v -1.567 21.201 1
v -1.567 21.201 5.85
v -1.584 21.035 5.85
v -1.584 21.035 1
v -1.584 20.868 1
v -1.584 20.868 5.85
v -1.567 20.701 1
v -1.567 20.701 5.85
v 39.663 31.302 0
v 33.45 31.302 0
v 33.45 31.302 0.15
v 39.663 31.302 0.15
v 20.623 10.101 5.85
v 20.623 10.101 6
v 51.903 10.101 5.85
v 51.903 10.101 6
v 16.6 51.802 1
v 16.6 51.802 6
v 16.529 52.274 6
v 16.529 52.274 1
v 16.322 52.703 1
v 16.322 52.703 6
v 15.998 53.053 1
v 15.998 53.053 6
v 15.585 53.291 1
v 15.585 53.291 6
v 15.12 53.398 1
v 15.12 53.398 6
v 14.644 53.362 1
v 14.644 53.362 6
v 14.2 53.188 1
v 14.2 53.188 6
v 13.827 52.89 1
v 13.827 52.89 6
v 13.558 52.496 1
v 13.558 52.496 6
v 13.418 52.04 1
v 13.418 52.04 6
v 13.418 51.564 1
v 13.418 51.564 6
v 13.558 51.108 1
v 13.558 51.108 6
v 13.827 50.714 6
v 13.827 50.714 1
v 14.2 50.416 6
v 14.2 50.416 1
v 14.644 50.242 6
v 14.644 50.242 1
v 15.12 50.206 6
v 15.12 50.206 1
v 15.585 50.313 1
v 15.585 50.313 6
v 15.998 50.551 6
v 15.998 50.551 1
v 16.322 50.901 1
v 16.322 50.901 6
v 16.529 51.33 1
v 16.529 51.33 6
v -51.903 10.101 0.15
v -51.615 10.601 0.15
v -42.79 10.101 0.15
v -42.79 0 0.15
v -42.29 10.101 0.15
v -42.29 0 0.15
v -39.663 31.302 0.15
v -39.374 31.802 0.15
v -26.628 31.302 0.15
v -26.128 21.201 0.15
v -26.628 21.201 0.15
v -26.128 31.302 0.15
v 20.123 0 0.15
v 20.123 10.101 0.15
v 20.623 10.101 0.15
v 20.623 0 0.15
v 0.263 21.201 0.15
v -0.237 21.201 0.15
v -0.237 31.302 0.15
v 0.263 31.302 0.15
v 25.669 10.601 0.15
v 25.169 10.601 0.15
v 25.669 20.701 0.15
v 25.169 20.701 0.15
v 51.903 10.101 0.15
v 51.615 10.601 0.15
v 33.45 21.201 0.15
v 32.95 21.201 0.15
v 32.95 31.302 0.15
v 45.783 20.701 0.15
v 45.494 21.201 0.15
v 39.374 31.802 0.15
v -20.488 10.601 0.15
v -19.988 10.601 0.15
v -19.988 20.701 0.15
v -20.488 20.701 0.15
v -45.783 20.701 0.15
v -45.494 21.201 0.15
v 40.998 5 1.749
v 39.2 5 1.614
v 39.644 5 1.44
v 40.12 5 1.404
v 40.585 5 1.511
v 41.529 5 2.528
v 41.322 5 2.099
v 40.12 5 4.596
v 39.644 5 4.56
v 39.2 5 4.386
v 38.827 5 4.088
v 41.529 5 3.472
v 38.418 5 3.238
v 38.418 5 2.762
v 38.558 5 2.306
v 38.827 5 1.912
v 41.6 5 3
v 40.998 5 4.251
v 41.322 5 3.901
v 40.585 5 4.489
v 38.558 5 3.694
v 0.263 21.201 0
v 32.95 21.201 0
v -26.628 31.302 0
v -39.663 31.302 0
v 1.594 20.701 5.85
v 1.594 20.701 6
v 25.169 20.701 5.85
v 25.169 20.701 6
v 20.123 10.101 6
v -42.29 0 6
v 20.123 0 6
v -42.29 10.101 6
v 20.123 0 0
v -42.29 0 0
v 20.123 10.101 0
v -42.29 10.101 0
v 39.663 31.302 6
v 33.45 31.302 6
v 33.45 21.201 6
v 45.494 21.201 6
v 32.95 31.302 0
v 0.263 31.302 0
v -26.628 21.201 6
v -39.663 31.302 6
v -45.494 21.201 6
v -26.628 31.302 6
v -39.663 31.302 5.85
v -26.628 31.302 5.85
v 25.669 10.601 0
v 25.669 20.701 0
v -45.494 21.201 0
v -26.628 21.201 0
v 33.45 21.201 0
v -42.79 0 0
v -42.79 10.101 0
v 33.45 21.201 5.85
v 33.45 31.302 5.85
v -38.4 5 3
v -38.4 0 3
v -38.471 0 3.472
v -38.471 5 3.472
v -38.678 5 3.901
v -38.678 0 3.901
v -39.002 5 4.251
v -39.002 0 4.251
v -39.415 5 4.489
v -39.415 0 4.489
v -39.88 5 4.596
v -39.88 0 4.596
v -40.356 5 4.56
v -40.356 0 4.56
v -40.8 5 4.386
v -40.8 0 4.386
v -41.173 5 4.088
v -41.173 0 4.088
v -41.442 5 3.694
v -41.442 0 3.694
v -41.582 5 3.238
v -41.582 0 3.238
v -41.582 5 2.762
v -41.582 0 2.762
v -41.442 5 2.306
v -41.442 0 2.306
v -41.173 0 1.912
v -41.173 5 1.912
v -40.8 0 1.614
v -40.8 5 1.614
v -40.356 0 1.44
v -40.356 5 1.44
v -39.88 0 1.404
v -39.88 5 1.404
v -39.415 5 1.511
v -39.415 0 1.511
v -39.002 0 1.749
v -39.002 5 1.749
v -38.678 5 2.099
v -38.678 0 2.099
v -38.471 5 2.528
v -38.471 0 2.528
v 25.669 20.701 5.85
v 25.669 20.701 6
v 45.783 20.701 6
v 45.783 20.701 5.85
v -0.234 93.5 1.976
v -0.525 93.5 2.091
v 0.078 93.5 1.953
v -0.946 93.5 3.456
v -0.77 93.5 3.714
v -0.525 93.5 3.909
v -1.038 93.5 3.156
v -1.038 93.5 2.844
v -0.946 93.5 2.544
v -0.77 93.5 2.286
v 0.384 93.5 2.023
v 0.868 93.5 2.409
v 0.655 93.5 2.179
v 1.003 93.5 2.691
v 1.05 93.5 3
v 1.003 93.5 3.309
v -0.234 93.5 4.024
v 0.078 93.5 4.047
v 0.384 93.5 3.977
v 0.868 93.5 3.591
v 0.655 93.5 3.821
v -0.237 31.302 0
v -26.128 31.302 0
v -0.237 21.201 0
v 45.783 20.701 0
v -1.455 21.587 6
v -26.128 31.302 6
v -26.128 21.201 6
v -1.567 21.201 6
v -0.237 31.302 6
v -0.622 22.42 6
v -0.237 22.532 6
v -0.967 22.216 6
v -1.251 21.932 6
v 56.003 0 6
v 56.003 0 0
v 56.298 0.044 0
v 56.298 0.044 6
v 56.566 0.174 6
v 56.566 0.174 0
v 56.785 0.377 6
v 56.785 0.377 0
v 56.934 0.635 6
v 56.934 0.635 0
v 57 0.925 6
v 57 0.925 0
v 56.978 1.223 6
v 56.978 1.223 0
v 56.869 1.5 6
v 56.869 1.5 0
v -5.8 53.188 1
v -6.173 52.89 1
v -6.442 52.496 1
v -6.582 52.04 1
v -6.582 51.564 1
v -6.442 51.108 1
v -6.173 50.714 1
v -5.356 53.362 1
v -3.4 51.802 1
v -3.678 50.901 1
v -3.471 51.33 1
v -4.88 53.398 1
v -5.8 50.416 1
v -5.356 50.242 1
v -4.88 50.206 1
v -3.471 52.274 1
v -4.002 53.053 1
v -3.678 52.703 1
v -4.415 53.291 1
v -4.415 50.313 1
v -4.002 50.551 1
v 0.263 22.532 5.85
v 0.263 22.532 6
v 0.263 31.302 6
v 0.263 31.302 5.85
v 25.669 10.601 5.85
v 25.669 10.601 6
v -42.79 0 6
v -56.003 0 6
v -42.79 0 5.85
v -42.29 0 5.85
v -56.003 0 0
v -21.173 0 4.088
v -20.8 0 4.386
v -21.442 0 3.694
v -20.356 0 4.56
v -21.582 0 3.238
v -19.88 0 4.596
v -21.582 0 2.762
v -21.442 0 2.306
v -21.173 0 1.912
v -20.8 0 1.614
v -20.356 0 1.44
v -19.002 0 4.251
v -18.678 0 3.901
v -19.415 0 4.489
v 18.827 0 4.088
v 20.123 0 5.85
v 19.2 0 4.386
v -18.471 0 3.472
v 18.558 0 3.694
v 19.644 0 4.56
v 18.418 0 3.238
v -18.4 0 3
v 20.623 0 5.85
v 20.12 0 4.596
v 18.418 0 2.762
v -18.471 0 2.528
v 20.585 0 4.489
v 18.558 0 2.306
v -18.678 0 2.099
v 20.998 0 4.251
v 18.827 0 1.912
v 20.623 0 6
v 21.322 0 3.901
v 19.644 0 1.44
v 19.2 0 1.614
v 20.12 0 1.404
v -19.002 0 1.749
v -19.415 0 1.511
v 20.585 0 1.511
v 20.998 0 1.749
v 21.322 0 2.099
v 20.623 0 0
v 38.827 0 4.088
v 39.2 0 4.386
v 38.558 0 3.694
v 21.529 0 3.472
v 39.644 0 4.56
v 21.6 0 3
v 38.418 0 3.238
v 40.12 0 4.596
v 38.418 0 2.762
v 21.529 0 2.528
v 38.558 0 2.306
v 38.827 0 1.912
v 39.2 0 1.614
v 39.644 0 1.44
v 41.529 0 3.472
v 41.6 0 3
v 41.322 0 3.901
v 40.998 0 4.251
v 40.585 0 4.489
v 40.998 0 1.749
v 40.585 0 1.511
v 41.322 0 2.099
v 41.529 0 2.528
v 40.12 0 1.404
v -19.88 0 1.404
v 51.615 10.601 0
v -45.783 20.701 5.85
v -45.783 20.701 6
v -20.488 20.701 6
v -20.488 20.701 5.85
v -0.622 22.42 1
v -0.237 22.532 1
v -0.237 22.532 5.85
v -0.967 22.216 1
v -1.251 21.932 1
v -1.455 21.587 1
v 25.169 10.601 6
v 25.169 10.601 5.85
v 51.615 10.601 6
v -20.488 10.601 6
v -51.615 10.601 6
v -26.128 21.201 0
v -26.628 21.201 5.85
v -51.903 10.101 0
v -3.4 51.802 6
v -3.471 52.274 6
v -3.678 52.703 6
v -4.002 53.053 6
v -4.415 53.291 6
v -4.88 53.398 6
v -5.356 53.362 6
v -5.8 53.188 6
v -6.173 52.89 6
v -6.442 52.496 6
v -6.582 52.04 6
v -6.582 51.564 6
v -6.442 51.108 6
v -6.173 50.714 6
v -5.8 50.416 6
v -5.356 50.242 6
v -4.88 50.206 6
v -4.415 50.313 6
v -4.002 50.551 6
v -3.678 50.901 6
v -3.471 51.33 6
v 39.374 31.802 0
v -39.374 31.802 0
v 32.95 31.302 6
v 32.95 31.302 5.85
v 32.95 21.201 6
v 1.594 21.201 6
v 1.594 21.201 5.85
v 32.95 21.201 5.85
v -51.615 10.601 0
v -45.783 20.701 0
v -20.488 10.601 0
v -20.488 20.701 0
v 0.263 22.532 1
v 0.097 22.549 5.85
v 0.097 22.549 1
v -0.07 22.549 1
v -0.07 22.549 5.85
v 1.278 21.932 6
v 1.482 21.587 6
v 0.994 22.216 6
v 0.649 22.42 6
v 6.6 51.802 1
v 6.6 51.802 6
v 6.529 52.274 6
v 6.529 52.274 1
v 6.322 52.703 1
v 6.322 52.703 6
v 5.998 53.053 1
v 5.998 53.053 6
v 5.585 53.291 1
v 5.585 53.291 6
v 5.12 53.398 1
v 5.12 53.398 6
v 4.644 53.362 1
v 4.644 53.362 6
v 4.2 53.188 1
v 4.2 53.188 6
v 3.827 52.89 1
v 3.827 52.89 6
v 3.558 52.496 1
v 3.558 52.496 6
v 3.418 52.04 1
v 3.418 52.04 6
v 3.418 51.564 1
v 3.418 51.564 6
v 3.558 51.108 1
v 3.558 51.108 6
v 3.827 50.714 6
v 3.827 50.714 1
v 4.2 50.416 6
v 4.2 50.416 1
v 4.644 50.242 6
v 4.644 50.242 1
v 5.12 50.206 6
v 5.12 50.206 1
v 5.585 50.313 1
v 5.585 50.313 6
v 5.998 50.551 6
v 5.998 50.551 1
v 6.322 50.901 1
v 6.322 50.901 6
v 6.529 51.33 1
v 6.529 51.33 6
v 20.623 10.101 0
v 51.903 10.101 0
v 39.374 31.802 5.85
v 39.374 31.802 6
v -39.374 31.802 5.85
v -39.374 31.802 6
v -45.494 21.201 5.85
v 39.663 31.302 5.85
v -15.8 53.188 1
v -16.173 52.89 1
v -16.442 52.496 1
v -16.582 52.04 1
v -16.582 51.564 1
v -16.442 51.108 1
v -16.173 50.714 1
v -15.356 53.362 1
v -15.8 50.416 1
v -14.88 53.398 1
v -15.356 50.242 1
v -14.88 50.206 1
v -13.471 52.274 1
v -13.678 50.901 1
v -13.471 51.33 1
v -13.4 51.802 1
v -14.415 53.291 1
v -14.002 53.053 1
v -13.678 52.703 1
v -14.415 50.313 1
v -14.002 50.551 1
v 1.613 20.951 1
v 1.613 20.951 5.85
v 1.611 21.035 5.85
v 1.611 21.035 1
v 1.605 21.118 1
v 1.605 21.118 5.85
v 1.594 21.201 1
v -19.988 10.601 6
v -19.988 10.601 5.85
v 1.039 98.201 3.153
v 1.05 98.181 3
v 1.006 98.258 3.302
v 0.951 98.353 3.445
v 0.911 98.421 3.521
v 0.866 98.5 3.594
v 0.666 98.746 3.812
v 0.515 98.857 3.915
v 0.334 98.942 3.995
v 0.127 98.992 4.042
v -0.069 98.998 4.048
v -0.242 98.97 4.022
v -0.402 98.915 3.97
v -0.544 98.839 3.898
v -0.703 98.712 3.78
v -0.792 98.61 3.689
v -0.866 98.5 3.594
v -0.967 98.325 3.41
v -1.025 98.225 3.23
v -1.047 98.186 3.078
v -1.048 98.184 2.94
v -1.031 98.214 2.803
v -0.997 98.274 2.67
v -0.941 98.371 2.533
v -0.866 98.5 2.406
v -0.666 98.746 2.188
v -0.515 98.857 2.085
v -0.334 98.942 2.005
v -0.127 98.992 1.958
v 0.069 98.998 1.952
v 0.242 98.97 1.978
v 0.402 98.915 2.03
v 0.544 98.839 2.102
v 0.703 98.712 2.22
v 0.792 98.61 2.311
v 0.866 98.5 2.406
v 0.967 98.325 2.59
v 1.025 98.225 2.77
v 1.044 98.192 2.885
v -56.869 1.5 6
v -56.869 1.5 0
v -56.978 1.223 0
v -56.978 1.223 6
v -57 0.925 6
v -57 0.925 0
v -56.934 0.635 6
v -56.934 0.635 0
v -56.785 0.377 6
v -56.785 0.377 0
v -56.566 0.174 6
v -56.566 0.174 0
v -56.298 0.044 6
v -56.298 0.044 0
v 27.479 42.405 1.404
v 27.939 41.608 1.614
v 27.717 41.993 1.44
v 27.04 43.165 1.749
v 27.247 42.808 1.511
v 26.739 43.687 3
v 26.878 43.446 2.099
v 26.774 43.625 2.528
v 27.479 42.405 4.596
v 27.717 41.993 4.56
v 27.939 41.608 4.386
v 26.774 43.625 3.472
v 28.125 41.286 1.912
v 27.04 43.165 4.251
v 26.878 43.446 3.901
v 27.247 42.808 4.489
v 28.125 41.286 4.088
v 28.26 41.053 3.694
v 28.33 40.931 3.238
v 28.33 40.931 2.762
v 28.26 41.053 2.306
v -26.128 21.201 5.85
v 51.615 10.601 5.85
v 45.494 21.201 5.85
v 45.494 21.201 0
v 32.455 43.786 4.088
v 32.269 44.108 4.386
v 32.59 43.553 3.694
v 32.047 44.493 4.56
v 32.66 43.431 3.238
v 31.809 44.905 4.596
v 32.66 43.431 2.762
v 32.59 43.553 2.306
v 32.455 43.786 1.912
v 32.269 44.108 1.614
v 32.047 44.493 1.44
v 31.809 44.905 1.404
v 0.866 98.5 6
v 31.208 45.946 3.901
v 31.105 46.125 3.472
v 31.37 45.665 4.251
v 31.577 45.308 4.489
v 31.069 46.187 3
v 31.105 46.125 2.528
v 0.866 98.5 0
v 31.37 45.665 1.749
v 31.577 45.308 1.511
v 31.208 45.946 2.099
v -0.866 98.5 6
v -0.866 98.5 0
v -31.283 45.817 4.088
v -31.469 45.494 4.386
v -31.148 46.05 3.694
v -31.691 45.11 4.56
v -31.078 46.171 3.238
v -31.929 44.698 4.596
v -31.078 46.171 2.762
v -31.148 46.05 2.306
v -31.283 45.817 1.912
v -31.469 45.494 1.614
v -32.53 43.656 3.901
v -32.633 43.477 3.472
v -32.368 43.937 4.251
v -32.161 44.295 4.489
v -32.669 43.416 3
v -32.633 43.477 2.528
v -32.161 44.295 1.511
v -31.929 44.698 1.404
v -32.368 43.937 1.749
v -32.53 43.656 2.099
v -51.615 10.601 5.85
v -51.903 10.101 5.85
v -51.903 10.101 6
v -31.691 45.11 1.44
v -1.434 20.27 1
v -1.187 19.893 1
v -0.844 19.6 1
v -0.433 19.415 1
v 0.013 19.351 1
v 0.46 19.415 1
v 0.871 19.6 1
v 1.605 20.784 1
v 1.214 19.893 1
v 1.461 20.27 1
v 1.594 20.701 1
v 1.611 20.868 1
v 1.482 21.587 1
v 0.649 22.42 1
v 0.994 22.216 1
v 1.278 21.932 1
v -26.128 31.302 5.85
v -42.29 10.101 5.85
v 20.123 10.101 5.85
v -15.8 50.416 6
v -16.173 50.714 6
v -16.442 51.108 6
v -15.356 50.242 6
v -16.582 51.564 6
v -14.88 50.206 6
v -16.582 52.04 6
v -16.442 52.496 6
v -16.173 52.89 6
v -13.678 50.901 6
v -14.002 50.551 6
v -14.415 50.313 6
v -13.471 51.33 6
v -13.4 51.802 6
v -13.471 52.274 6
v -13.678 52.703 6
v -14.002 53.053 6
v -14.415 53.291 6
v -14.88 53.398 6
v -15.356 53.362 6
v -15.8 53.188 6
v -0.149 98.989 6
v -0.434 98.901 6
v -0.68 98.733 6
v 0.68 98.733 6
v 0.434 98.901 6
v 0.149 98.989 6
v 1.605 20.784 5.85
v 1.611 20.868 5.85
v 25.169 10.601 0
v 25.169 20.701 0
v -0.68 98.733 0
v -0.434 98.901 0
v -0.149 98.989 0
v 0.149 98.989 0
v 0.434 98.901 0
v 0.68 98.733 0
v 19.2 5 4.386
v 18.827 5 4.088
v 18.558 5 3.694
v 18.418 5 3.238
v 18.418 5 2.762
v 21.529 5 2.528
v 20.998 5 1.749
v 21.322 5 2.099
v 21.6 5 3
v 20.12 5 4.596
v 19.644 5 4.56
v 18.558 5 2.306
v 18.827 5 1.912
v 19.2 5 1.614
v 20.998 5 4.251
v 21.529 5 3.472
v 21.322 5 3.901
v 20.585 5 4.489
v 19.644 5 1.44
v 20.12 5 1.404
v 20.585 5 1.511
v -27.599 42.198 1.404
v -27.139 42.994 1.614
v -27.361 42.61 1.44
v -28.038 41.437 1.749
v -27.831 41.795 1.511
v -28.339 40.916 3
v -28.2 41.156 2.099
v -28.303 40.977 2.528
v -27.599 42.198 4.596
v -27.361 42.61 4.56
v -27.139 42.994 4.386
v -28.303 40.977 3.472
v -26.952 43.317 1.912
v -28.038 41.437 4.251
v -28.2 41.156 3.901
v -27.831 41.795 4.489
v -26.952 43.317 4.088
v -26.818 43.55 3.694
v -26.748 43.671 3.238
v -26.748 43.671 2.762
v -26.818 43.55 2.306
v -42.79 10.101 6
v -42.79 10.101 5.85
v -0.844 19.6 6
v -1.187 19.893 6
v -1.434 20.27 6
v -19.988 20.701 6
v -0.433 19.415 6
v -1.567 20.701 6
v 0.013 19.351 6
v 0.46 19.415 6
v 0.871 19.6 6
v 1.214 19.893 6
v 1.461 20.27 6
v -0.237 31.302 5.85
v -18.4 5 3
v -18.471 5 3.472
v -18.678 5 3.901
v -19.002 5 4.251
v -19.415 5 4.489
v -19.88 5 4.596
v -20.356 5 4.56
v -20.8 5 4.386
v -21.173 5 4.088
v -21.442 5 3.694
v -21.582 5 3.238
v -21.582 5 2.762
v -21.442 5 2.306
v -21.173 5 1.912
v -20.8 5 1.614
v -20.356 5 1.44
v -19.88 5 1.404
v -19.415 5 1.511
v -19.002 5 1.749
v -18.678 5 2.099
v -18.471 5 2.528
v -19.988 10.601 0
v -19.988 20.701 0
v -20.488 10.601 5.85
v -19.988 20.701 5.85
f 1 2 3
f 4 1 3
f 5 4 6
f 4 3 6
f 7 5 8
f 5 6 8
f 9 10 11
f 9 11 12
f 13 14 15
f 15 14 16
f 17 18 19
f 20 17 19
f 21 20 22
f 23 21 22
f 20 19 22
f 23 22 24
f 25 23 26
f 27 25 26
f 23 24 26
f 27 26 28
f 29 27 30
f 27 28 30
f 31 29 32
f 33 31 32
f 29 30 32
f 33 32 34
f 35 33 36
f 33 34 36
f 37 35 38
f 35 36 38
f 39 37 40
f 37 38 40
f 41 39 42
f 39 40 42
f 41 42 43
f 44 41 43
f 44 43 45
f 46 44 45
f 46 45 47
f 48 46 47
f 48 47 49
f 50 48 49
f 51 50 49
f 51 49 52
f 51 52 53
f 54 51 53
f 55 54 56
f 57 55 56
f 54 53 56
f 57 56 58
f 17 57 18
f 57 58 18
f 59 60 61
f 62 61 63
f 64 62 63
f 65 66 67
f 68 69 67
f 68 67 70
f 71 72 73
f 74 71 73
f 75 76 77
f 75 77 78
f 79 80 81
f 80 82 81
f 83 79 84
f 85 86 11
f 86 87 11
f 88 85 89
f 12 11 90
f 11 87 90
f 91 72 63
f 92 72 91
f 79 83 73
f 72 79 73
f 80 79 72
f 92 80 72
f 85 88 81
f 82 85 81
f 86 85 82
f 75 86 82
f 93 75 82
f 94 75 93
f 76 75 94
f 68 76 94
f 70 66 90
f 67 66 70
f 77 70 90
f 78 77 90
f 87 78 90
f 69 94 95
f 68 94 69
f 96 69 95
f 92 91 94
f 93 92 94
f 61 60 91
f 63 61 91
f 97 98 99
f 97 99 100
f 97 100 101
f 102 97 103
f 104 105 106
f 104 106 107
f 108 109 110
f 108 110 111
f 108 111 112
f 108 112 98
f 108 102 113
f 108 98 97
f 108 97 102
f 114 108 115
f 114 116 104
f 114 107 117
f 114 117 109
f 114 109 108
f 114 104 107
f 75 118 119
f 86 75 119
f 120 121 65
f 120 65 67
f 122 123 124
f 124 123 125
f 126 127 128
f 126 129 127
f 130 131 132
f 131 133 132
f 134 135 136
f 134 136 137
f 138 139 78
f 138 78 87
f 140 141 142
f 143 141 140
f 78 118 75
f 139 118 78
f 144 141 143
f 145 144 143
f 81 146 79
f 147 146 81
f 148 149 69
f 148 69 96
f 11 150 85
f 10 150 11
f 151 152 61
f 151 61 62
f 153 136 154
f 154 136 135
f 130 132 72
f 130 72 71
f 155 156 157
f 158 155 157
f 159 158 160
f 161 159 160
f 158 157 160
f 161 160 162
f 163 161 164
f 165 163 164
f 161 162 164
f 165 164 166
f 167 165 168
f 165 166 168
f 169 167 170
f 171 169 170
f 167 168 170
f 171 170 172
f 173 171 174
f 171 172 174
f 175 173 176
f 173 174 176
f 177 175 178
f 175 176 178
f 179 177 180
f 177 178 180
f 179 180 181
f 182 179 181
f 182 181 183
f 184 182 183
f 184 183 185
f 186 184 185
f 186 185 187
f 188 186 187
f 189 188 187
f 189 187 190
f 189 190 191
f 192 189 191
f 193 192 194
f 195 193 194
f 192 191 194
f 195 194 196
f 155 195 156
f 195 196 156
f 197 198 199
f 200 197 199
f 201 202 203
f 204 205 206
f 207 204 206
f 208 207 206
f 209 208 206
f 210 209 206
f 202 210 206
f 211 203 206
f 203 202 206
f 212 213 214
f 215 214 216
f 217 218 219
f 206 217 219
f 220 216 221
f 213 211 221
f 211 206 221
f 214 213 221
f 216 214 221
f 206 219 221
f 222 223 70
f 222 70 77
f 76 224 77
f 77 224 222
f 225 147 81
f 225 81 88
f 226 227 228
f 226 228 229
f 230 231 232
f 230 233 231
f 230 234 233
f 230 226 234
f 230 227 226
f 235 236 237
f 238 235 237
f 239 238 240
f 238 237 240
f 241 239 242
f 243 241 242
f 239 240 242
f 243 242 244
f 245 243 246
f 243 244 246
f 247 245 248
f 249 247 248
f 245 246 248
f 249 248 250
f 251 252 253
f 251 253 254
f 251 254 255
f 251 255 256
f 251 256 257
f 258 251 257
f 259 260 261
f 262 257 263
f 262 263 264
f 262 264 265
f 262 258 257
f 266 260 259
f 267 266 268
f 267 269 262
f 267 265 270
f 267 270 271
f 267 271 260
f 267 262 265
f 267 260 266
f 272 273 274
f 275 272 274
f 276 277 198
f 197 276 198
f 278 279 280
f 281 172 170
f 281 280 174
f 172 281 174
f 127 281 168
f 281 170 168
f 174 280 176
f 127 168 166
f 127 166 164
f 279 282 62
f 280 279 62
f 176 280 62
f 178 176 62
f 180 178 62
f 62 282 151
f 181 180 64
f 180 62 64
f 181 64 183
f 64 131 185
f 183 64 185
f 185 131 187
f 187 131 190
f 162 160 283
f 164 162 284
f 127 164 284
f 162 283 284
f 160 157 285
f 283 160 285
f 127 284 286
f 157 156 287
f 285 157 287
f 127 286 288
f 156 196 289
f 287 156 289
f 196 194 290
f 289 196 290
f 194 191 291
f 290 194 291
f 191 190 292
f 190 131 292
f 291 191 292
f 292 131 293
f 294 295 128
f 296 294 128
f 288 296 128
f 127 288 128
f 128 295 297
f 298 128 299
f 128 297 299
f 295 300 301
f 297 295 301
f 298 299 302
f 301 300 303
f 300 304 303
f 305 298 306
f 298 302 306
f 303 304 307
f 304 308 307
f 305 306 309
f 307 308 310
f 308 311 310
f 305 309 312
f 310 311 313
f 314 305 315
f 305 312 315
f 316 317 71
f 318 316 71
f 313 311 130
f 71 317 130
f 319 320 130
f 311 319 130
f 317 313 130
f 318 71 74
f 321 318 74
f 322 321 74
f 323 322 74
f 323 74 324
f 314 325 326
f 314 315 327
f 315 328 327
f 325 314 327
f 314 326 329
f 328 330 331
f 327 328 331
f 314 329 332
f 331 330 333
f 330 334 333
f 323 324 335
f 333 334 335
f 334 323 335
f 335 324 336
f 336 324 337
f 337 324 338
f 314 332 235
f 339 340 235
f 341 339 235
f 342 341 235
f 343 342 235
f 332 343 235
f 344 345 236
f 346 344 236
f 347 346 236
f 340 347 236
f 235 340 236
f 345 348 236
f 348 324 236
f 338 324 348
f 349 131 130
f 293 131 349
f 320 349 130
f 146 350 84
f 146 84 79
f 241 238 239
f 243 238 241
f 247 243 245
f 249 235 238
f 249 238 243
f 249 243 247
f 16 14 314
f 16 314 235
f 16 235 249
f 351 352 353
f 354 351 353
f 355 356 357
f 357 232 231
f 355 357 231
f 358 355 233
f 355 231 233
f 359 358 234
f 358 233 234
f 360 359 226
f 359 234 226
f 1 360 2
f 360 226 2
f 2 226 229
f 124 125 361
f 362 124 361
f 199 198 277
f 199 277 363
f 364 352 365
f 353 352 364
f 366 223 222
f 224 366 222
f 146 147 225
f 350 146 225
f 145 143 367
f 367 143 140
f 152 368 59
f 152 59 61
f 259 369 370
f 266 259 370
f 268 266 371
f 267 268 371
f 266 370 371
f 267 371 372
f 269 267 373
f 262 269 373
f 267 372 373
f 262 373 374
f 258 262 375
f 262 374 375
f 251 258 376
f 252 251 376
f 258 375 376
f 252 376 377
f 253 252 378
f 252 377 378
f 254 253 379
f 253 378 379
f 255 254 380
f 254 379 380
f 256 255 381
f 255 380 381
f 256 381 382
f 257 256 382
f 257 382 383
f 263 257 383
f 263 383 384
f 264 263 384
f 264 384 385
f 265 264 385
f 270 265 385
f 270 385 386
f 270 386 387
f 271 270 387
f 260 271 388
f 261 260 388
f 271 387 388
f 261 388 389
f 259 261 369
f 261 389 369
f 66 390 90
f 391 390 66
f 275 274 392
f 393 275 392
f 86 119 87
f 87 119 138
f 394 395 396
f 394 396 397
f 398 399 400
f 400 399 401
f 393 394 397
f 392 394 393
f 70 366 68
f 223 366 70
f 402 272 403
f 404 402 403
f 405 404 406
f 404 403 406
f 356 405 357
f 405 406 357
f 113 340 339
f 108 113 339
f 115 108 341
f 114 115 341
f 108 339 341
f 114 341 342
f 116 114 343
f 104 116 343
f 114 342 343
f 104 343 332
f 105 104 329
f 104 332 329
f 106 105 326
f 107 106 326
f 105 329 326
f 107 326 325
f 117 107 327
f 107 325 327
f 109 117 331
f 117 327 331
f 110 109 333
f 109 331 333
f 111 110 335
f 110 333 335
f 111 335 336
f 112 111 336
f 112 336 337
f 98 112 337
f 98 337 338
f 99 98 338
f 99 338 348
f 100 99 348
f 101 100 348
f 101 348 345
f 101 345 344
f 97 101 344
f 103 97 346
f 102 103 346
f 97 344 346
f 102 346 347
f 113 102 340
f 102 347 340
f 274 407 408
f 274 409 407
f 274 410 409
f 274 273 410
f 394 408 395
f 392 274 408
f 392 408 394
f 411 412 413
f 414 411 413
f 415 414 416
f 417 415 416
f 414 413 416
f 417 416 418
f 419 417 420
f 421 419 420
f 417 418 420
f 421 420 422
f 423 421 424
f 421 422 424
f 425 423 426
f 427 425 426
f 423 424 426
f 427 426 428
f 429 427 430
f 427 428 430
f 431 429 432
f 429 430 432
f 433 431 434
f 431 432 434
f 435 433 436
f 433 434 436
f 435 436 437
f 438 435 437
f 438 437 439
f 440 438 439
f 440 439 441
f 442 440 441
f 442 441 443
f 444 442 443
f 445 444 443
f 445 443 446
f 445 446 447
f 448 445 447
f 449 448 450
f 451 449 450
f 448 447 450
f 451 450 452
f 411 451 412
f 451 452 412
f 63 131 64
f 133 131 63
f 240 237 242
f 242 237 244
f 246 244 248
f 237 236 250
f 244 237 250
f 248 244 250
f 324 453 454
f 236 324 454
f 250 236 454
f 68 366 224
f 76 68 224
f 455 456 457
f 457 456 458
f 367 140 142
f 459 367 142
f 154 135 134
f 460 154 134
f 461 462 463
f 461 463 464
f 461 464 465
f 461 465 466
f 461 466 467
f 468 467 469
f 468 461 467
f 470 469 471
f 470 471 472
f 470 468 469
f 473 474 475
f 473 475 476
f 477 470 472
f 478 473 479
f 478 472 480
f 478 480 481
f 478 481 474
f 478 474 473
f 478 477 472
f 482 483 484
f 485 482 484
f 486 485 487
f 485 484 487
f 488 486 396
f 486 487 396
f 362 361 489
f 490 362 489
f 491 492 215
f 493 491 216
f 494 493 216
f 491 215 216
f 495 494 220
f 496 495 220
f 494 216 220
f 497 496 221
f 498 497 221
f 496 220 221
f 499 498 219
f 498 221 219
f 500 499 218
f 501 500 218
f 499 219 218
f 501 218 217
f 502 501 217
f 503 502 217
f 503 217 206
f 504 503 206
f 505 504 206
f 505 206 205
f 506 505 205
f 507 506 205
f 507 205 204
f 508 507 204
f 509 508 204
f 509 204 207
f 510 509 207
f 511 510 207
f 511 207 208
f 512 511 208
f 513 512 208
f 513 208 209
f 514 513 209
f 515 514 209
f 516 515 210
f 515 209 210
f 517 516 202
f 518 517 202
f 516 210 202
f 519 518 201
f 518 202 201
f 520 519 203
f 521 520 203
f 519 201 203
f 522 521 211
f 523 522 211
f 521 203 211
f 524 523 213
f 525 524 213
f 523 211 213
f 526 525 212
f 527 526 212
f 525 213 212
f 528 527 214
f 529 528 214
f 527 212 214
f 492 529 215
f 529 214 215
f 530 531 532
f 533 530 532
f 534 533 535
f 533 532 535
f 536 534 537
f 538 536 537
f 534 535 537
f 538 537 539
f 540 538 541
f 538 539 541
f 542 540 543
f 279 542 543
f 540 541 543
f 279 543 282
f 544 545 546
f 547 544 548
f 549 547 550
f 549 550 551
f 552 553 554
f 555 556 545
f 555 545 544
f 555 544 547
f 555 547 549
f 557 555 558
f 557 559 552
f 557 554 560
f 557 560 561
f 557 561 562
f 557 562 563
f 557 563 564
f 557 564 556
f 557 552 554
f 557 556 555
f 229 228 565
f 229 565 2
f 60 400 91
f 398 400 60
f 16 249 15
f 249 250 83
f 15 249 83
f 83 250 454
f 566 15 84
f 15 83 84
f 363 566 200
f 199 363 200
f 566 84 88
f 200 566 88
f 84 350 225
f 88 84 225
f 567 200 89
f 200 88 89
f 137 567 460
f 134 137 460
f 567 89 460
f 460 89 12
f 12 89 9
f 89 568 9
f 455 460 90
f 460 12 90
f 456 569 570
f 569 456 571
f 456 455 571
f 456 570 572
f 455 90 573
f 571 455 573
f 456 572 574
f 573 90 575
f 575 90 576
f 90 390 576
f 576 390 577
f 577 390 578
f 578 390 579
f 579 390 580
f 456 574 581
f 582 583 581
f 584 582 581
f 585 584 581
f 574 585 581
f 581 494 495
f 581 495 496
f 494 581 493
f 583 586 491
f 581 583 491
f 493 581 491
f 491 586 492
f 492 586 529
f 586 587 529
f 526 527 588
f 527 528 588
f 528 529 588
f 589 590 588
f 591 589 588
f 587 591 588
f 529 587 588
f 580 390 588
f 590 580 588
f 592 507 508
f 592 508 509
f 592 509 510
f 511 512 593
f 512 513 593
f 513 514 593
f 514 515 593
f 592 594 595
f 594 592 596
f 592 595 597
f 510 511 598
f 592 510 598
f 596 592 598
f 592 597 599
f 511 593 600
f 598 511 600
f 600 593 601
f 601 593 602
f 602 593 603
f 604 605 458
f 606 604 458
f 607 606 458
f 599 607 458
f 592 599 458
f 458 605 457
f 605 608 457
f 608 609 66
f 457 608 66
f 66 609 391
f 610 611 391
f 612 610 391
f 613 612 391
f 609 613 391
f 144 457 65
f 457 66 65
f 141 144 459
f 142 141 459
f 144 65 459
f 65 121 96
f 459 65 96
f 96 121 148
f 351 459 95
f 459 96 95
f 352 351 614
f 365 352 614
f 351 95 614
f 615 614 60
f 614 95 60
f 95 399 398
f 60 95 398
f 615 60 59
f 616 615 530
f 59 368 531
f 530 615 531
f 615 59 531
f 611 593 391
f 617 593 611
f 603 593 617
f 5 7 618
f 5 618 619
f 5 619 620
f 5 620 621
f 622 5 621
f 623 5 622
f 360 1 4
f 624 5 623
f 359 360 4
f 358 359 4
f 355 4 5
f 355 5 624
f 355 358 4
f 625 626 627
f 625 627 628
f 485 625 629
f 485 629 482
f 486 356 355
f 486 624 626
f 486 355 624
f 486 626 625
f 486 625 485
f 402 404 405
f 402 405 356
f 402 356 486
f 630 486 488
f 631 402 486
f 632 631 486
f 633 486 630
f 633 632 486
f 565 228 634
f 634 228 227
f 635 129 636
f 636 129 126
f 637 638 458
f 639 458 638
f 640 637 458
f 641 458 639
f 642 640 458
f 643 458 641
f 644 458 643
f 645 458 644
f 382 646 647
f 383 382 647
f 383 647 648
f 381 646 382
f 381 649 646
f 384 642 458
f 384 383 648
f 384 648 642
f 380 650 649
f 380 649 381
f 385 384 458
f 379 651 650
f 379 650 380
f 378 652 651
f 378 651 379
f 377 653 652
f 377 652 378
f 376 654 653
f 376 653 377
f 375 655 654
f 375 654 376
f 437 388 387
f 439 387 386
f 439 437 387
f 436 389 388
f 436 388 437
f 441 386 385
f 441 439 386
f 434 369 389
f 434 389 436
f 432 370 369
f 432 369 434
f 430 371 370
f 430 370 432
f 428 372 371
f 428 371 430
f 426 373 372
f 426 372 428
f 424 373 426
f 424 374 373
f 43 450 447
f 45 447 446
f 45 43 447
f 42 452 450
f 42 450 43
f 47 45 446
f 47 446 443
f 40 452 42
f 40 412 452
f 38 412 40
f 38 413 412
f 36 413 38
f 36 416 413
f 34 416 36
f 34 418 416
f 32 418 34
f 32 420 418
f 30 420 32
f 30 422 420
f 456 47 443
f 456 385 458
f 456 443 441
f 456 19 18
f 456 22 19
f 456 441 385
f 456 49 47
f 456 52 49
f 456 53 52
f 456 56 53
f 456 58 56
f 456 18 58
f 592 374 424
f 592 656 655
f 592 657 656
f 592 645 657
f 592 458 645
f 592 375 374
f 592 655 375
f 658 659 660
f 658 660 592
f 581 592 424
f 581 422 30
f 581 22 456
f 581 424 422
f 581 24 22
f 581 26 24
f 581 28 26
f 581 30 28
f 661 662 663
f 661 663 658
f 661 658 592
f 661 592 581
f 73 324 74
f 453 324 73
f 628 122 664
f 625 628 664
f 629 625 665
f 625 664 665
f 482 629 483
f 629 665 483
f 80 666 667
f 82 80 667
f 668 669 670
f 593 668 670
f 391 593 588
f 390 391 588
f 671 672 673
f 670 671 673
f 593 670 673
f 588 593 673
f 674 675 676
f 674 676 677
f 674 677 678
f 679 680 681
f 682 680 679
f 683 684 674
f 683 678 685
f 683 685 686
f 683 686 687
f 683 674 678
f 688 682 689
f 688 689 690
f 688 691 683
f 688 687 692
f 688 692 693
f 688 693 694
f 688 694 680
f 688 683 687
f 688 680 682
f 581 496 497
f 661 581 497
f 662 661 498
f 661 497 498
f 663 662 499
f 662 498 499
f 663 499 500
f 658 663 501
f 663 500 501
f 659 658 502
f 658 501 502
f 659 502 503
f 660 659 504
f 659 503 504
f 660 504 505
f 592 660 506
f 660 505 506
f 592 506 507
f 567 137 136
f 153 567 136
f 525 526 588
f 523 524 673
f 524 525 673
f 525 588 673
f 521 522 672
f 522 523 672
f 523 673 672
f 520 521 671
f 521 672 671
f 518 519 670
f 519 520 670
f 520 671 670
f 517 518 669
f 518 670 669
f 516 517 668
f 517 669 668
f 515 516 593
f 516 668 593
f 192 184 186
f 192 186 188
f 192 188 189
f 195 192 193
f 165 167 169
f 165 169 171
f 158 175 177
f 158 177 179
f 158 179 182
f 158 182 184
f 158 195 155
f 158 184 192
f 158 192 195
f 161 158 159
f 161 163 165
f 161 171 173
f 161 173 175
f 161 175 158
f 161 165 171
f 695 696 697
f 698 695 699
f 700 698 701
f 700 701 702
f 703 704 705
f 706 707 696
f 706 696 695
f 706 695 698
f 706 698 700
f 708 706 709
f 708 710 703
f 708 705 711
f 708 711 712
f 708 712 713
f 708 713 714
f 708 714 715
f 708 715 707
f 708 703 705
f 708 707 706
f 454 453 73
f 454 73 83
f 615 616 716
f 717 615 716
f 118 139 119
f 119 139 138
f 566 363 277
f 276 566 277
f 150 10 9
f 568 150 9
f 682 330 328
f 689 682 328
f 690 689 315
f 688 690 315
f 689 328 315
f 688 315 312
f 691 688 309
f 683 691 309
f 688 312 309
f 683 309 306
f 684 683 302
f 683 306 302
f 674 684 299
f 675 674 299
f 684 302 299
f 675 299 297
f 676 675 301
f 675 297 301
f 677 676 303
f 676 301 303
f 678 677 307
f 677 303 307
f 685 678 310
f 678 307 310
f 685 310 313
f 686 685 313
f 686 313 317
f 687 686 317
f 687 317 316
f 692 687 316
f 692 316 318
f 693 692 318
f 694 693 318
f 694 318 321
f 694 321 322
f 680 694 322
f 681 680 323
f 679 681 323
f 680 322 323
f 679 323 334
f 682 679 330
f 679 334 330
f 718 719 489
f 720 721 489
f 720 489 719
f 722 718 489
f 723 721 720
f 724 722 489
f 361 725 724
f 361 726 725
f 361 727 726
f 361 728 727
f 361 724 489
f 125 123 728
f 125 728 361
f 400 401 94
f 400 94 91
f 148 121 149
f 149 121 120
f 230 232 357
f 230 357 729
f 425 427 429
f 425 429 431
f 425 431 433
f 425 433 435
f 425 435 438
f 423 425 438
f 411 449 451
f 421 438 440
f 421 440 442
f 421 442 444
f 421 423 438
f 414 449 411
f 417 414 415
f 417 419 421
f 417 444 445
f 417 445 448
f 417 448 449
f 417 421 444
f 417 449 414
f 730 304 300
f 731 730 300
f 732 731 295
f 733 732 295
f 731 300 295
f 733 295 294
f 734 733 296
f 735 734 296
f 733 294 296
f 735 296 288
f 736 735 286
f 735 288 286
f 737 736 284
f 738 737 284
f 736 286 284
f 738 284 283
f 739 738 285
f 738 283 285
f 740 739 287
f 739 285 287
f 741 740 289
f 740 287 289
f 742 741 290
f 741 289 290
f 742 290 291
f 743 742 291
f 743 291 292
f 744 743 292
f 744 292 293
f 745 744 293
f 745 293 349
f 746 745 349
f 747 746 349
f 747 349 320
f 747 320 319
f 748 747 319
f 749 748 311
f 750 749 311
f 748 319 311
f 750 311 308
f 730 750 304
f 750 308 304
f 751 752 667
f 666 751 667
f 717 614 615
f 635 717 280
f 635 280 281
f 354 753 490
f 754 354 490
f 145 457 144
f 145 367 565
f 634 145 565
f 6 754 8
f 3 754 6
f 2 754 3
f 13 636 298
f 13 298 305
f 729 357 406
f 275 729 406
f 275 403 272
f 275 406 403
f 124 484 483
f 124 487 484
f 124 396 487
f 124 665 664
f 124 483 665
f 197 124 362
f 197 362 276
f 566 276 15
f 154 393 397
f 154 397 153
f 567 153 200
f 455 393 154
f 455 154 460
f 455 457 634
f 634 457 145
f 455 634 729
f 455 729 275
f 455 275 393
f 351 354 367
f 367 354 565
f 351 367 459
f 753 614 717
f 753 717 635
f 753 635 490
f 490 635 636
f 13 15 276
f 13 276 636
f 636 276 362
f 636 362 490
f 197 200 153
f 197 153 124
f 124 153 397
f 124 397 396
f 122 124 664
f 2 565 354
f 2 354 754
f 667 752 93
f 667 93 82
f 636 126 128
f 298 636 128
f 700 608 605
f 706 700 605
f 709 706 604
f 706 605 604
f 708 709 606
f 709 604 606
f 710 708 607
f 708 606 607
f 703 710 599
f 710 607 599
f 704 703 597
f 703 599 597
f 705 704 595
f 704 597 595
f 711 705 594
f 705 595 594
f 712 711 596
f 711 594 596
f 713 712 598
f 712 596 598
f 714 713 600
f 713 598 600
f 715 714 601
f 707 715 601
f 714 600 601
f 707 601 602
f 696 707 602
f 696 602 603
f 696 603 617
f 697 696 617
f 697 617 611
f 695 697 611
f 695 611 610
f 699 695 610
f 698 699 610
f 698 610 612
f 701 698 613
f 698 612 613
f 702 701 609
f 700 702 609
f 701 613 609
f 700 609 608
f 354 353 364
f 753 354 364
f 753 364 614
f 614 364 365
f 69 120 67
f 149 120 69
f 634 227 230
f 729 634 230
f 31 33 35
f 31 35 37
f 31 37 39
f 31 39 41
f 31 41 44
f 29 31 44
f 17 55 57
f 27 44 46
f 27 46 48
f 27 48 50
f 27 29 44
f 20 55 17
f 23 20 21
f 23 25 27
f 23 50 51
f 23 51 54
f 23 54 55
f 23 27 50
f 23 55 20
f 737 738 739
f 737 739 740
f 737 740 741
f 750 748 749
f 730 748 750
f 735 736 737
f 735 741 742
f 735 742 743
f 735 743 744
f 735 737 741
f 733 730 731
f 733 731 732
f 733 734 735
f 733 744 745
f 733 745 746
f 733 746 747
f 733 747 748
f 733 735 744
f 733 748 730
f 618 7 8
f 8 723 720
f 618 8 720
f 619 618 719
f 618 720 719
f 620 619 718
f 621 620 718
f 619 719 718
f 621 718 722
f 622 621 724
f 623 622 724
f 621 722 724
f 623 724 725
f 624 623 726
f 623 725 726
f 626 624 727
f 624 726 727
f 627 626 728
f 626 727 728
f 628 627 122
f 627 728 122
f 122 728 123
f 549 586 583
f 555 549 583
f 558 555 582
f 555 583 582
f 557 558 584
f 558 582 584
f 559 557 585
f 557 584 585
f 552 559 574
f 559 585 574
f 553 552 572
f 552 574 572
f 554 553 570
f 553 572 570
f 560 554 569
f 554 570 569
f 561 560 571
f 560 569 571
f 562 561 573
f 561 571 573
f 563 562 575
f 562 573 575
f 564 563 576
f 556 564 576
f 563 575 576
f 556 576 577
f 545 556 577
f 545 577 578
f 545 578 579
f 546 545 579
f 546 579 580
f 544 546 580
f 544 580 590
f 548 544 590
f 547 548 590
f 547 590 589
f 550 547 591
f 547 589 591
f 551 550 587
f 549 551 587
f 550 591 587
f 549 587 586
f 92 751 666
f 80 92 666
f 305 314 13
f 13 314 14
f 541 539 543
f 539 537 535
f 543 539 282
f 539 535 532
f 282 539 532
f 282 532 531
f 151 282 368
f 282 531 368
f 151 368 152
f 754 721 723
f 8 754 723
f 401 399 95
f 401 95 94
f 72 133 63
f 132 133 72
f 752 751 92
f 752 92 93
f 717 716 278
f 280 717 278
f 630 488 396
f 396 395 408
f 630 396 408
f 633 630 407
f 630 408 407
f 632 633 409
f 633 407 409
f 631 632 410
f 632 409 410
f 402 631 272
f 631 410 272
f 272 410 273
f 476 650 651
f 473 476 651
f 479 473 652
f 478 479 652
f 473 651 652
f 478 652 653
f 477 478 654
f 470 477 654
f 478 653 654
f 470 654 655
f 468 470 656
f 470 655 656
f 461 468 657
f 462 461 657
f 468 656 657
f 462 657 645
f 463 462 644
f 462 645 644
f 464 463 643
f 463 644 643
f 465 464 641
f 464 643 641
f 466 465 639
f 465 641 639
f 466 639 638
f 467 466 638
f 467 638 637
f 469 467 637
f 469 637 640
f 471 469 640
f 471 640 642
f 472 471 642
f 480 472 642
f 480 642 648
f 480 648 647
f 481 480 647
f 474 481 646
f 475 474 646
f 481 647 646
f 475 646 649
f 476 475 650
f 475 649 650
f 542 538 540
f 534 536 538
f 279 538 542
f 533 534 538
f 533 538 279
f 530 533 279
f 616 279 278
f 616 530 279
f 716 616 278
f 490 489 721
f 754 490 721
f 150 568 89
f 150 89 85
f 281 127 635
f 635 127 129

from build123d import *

# Parameters (mm, degrees)
F3_DEPTH       = 6
F4_W           = 32.6863850343
F4_H           = 10.1006624426
F4_W_2         = 25.8918322674
F5_DEPTH       = 0.15
F6_W           = 25.8918322674
F6_H           = 10.1006624426
F6_W_2         = 45.1567518413
F6_W_3         = 32.6863850343
F7_DEPTH       = 0.15
F8_R           = 1.6
F9_DEPTH       = 5
F11_R          = 1.05
F12_DEPTH      = 5
F12_DEPTH_BACK = 0.501
F13_R          = 1.6
F14_DEPTH      = 5
F15_R          = 1.6
F16_DEPTH      = 5
F17_R          = 1.6
F18_DEPTH      = 5


with BuildPart() as f3:
    # F2 (on Top) → F3 (new body)
    with BuildSketch(Plane.XY):
        with BuildLine():
            ThreePointArc((0.8660254038, 98.5), (0, 99), (-0.8660254038, 98.5))
            Line((-0.8660254038, 98.5), (-56.8690015152, 1.5))
            ThreePointArc((-56.8690015152, 1.5), (-56.8690015152, 0.5), (-56.0029761114, 0))
            Line((-56.0029761114, 0), (56.0029761114, 0))
            ThreePointArc((56.0029761114, 0), (56.8690015152, 0.5), (56.8690015152, 1.5))
            Line((56.8690015152, 1.5), (0.8660254038, 98.5))
        make_face()
    extrude(amount=F3_DEPTH)

    # F4 (on face) → F5 (cut)
    with BuildSketch(Plane.XY.offset(6)):
        Polygon((39.6628161091, 31.3019873277), (39.3741409745, 31.8019873277), (0, 31.8019873277), (0, 20.7013248852), (25.1688986466, 20.7013248852), (25.1688986466, 10.6006624426), (0, 10.6006624426), (0, 10.1006624426), (20.1229155064, 10.1006624426), (20.1229155064, 0), (20.6229155064, 0), (20.6229155064, 10.1006624426), (51.9034067387, 10.1006624426), (51.6147316042, 10.6006624426), (25.6688986466, 10.6006624426), (25.6688986466, 20.7013248852), (45.7831114239, 20.7013248852), (45.4944362893, 21.2013248852), (33.4497465572, 21.2013248852), (33.4497465572, 31.3019873277), align=None)
        with Locations((16.60655404, 26.2516561065)):
            Rectangle(F4_W, F4_H, mode=Mode.SUBTRACT)
        Polygon((0, 20.7013248852), (0, 31.8019873277), (-39.3741409745, 31.8019873277), (-39.6628161091, 31.3019873277), (-26.6284707446, 31.3019873277), (-26.6284707446, 21.2013248852), (-45.4944362893, 21.2013248852), (-45.7831114239, 20.7013248852), (-20.4878531947, 20.7013248852), (-20.4878531947, 10.6006624426), (-51.6147316042, 10.6006624426), (-51.9034067387, 10.1006624426), (-42.7899323404, 10.1006624426), (-42.7899323404, 0), (-42.2899323404, 0), (-42.2899323404, 10.1006624426), (0, 10.1006624426), (0, 10.6006624426), (-19.9878531947, 10.6006624426), (-19.9878531947, 20.7013248852), align=None)
        with Locations((-13.1825546109, 26.2516561065)):
            Rectangle(F4_W_2, F4_H, mode=Mode.SUBTRACT)
    extrude(amount=-F5_DEPTH, mode=Mode.SUBTRACT)

    # F6 (on face) → F7 (cut)
    with BuildSketch(Plane.XY):
        Polygon((-51.9034067387, 10.1006624426), (-42.7899323404, 10.1006624426), (-42.7899323404, 0), (-42.2899323404, 0), (-42.2899323404, 10.1006624426), (20.1229155064, 10.1006624426), (20.1229155064, 0), (20.6229155064, 0), (20.6229155064, 10.1006624426), (51.9034067387, 10.1006624426), (51.6147316042, 10.6006624426), (25.6688986466, 10.6006624426), (25.6688986466, 20.7013248852), (45.7831114239, 20.7013248852), (45.4944362893, 21.2013248852), (33.4497465572, 21.2013248852), (33.4497465572, 31.3019873277), (39.6628161091, 31.3019873277), (39.3741409745, 31.8019873277), (-39.3741409745, 31.8019873277), (-39.6628161091, 31.3019873277), (-26.6284707446, 31.3019873277), (-26.6284707446, 21.2013248852), (-45.4944362893, 21.2013248852), (-45.7831114239, 20.7013248852), (-20.4878531947, 20.7013248852), (-20.4878531947, 10.6006624426), (-51.6147316042, 10.6006624426), align=None)
        with Locations((-13.1825546109, 26.2516561065)):
            Rectangle(F6_W, F6_H, mode=Mode.SUBTRACT)
        with Locations((2.5905227259, 15.6509936639)):
            Rectangle(F6_W_2, F6_H, mode=Mode.SUBTRACT)
        with Locations((16.60655404, 26.2516561065)):
            Rectangle(F6_W_3, F6_H, mode=Mode.SUBTRACT)
    extrude(amount=F7_DEPTH, mode=Mode.SUBTRACT)

    # F8 (on face) → F9 (cut)
    with BuildSketch(Plane.XY.offset(6)):
        with BuildLine():
            ThreePointArc((1.5937095858, 20.7013248852), (1.6084409724, 20.8259392813), (1.6133615229, 20.9513248852))
            ThreePointArc((1.6133615229, 20.9513248852), (1.6084409724, 21.076710489), (1.5937095858, 21.2013248852))
            ThreePointArc((1.5937095858, 21.2013248852), (1.1447323728, 22.0826957351), (0.2633615229, 22.5316729481))
            ThreePointArc((0.2633615229, 22.5316729481), (0.0133615229, 22.5513248852), (-0.2366384771, 22.5316729481))
            ThreePointArc((-0.2366384771, 22.5316729481), (-1.118009327, 22.0826957351), (-1.5669865401, 21.2013248852))
            ThreePointArc((-1.5669865401, 21.2013248852), (-1.5866384771, 20.9513248852), (-1.5669865401, 20.7013248852))
            ThreePointArc((-1.5669865401, 20.7013248852), (0.0133615229, 19.3513248852), (1.5937095858, 20.7013248852))
        make_face()
        with Locations((5, 51.8019873277)):
            Circle(F8_R)
        with Locations((-5, 51.8019873277)):
            Circle(F8_R)
        with Locations((15, 51.8019873277)):
            Circle(F8_R)
        with Locations((-15, 51.8019873277)):
            Circle(F8_R)
    extrude(amount=-F9_DEPTH, mode=Mode.SUBTRACT)

    # F11 (on 3pt) → F12 (cut, two sides)
    with BuildSketch(Plane.XZ.offset(-98.5)) as f12_sk:
        with Locations((0, 3)):
            Circle(F11_R)
    extrude(amount=F12_DEPTH, mode=Mode.SUBTRACT)
    extrude(f12_sk.sketch, amount=-F12_DEPTH_BACK, mode=Mode.SUBTRACT)

    # F13 (on face) → F14 (cut)
    with BuildSketch(Plane.XZ):
        with Locations((-40, 3)):
            Circle(F13_R)
        with Locations((-20, 3)):
            Circle(F13_R)
        with Locations((20, 3)):
            Circle(F13_R)
        with Locations((40, 3)):
            Circle(F13_R)
    extrude(amount=-F14_DEPTH, mode=Mode.SUBTRACT)

    # F15 (on face) → F16 (cut)
    with BuildSketch(Plane(origin=(43.3012701892, 25, 0), x_dir=(-0.5, 0.8660254038, 0), z_dir=(0.8660254038, 0.5, 0))):
        with Locations((22.8645373481, 3)):
            Circle(F15_R)
    extrude(amount=-F16_DEPTH, mode=Mode.SUBTRACT)

    # F17 (on face) → F18 (cut)
    with BuildSketch(Plane(origin=(-43.3012701892, 25, 0), x_dir=(-0.5, -0.8660254038, 0), z_dir=(-0.8660254038, 0.5, 0))):
        with Locations((-22.8645373481, 3)):
            Circle(F17_R)
    extrude(amount=-F18_DEPTH, mode=Mode.SUBTRACT)


solid = f3.part
